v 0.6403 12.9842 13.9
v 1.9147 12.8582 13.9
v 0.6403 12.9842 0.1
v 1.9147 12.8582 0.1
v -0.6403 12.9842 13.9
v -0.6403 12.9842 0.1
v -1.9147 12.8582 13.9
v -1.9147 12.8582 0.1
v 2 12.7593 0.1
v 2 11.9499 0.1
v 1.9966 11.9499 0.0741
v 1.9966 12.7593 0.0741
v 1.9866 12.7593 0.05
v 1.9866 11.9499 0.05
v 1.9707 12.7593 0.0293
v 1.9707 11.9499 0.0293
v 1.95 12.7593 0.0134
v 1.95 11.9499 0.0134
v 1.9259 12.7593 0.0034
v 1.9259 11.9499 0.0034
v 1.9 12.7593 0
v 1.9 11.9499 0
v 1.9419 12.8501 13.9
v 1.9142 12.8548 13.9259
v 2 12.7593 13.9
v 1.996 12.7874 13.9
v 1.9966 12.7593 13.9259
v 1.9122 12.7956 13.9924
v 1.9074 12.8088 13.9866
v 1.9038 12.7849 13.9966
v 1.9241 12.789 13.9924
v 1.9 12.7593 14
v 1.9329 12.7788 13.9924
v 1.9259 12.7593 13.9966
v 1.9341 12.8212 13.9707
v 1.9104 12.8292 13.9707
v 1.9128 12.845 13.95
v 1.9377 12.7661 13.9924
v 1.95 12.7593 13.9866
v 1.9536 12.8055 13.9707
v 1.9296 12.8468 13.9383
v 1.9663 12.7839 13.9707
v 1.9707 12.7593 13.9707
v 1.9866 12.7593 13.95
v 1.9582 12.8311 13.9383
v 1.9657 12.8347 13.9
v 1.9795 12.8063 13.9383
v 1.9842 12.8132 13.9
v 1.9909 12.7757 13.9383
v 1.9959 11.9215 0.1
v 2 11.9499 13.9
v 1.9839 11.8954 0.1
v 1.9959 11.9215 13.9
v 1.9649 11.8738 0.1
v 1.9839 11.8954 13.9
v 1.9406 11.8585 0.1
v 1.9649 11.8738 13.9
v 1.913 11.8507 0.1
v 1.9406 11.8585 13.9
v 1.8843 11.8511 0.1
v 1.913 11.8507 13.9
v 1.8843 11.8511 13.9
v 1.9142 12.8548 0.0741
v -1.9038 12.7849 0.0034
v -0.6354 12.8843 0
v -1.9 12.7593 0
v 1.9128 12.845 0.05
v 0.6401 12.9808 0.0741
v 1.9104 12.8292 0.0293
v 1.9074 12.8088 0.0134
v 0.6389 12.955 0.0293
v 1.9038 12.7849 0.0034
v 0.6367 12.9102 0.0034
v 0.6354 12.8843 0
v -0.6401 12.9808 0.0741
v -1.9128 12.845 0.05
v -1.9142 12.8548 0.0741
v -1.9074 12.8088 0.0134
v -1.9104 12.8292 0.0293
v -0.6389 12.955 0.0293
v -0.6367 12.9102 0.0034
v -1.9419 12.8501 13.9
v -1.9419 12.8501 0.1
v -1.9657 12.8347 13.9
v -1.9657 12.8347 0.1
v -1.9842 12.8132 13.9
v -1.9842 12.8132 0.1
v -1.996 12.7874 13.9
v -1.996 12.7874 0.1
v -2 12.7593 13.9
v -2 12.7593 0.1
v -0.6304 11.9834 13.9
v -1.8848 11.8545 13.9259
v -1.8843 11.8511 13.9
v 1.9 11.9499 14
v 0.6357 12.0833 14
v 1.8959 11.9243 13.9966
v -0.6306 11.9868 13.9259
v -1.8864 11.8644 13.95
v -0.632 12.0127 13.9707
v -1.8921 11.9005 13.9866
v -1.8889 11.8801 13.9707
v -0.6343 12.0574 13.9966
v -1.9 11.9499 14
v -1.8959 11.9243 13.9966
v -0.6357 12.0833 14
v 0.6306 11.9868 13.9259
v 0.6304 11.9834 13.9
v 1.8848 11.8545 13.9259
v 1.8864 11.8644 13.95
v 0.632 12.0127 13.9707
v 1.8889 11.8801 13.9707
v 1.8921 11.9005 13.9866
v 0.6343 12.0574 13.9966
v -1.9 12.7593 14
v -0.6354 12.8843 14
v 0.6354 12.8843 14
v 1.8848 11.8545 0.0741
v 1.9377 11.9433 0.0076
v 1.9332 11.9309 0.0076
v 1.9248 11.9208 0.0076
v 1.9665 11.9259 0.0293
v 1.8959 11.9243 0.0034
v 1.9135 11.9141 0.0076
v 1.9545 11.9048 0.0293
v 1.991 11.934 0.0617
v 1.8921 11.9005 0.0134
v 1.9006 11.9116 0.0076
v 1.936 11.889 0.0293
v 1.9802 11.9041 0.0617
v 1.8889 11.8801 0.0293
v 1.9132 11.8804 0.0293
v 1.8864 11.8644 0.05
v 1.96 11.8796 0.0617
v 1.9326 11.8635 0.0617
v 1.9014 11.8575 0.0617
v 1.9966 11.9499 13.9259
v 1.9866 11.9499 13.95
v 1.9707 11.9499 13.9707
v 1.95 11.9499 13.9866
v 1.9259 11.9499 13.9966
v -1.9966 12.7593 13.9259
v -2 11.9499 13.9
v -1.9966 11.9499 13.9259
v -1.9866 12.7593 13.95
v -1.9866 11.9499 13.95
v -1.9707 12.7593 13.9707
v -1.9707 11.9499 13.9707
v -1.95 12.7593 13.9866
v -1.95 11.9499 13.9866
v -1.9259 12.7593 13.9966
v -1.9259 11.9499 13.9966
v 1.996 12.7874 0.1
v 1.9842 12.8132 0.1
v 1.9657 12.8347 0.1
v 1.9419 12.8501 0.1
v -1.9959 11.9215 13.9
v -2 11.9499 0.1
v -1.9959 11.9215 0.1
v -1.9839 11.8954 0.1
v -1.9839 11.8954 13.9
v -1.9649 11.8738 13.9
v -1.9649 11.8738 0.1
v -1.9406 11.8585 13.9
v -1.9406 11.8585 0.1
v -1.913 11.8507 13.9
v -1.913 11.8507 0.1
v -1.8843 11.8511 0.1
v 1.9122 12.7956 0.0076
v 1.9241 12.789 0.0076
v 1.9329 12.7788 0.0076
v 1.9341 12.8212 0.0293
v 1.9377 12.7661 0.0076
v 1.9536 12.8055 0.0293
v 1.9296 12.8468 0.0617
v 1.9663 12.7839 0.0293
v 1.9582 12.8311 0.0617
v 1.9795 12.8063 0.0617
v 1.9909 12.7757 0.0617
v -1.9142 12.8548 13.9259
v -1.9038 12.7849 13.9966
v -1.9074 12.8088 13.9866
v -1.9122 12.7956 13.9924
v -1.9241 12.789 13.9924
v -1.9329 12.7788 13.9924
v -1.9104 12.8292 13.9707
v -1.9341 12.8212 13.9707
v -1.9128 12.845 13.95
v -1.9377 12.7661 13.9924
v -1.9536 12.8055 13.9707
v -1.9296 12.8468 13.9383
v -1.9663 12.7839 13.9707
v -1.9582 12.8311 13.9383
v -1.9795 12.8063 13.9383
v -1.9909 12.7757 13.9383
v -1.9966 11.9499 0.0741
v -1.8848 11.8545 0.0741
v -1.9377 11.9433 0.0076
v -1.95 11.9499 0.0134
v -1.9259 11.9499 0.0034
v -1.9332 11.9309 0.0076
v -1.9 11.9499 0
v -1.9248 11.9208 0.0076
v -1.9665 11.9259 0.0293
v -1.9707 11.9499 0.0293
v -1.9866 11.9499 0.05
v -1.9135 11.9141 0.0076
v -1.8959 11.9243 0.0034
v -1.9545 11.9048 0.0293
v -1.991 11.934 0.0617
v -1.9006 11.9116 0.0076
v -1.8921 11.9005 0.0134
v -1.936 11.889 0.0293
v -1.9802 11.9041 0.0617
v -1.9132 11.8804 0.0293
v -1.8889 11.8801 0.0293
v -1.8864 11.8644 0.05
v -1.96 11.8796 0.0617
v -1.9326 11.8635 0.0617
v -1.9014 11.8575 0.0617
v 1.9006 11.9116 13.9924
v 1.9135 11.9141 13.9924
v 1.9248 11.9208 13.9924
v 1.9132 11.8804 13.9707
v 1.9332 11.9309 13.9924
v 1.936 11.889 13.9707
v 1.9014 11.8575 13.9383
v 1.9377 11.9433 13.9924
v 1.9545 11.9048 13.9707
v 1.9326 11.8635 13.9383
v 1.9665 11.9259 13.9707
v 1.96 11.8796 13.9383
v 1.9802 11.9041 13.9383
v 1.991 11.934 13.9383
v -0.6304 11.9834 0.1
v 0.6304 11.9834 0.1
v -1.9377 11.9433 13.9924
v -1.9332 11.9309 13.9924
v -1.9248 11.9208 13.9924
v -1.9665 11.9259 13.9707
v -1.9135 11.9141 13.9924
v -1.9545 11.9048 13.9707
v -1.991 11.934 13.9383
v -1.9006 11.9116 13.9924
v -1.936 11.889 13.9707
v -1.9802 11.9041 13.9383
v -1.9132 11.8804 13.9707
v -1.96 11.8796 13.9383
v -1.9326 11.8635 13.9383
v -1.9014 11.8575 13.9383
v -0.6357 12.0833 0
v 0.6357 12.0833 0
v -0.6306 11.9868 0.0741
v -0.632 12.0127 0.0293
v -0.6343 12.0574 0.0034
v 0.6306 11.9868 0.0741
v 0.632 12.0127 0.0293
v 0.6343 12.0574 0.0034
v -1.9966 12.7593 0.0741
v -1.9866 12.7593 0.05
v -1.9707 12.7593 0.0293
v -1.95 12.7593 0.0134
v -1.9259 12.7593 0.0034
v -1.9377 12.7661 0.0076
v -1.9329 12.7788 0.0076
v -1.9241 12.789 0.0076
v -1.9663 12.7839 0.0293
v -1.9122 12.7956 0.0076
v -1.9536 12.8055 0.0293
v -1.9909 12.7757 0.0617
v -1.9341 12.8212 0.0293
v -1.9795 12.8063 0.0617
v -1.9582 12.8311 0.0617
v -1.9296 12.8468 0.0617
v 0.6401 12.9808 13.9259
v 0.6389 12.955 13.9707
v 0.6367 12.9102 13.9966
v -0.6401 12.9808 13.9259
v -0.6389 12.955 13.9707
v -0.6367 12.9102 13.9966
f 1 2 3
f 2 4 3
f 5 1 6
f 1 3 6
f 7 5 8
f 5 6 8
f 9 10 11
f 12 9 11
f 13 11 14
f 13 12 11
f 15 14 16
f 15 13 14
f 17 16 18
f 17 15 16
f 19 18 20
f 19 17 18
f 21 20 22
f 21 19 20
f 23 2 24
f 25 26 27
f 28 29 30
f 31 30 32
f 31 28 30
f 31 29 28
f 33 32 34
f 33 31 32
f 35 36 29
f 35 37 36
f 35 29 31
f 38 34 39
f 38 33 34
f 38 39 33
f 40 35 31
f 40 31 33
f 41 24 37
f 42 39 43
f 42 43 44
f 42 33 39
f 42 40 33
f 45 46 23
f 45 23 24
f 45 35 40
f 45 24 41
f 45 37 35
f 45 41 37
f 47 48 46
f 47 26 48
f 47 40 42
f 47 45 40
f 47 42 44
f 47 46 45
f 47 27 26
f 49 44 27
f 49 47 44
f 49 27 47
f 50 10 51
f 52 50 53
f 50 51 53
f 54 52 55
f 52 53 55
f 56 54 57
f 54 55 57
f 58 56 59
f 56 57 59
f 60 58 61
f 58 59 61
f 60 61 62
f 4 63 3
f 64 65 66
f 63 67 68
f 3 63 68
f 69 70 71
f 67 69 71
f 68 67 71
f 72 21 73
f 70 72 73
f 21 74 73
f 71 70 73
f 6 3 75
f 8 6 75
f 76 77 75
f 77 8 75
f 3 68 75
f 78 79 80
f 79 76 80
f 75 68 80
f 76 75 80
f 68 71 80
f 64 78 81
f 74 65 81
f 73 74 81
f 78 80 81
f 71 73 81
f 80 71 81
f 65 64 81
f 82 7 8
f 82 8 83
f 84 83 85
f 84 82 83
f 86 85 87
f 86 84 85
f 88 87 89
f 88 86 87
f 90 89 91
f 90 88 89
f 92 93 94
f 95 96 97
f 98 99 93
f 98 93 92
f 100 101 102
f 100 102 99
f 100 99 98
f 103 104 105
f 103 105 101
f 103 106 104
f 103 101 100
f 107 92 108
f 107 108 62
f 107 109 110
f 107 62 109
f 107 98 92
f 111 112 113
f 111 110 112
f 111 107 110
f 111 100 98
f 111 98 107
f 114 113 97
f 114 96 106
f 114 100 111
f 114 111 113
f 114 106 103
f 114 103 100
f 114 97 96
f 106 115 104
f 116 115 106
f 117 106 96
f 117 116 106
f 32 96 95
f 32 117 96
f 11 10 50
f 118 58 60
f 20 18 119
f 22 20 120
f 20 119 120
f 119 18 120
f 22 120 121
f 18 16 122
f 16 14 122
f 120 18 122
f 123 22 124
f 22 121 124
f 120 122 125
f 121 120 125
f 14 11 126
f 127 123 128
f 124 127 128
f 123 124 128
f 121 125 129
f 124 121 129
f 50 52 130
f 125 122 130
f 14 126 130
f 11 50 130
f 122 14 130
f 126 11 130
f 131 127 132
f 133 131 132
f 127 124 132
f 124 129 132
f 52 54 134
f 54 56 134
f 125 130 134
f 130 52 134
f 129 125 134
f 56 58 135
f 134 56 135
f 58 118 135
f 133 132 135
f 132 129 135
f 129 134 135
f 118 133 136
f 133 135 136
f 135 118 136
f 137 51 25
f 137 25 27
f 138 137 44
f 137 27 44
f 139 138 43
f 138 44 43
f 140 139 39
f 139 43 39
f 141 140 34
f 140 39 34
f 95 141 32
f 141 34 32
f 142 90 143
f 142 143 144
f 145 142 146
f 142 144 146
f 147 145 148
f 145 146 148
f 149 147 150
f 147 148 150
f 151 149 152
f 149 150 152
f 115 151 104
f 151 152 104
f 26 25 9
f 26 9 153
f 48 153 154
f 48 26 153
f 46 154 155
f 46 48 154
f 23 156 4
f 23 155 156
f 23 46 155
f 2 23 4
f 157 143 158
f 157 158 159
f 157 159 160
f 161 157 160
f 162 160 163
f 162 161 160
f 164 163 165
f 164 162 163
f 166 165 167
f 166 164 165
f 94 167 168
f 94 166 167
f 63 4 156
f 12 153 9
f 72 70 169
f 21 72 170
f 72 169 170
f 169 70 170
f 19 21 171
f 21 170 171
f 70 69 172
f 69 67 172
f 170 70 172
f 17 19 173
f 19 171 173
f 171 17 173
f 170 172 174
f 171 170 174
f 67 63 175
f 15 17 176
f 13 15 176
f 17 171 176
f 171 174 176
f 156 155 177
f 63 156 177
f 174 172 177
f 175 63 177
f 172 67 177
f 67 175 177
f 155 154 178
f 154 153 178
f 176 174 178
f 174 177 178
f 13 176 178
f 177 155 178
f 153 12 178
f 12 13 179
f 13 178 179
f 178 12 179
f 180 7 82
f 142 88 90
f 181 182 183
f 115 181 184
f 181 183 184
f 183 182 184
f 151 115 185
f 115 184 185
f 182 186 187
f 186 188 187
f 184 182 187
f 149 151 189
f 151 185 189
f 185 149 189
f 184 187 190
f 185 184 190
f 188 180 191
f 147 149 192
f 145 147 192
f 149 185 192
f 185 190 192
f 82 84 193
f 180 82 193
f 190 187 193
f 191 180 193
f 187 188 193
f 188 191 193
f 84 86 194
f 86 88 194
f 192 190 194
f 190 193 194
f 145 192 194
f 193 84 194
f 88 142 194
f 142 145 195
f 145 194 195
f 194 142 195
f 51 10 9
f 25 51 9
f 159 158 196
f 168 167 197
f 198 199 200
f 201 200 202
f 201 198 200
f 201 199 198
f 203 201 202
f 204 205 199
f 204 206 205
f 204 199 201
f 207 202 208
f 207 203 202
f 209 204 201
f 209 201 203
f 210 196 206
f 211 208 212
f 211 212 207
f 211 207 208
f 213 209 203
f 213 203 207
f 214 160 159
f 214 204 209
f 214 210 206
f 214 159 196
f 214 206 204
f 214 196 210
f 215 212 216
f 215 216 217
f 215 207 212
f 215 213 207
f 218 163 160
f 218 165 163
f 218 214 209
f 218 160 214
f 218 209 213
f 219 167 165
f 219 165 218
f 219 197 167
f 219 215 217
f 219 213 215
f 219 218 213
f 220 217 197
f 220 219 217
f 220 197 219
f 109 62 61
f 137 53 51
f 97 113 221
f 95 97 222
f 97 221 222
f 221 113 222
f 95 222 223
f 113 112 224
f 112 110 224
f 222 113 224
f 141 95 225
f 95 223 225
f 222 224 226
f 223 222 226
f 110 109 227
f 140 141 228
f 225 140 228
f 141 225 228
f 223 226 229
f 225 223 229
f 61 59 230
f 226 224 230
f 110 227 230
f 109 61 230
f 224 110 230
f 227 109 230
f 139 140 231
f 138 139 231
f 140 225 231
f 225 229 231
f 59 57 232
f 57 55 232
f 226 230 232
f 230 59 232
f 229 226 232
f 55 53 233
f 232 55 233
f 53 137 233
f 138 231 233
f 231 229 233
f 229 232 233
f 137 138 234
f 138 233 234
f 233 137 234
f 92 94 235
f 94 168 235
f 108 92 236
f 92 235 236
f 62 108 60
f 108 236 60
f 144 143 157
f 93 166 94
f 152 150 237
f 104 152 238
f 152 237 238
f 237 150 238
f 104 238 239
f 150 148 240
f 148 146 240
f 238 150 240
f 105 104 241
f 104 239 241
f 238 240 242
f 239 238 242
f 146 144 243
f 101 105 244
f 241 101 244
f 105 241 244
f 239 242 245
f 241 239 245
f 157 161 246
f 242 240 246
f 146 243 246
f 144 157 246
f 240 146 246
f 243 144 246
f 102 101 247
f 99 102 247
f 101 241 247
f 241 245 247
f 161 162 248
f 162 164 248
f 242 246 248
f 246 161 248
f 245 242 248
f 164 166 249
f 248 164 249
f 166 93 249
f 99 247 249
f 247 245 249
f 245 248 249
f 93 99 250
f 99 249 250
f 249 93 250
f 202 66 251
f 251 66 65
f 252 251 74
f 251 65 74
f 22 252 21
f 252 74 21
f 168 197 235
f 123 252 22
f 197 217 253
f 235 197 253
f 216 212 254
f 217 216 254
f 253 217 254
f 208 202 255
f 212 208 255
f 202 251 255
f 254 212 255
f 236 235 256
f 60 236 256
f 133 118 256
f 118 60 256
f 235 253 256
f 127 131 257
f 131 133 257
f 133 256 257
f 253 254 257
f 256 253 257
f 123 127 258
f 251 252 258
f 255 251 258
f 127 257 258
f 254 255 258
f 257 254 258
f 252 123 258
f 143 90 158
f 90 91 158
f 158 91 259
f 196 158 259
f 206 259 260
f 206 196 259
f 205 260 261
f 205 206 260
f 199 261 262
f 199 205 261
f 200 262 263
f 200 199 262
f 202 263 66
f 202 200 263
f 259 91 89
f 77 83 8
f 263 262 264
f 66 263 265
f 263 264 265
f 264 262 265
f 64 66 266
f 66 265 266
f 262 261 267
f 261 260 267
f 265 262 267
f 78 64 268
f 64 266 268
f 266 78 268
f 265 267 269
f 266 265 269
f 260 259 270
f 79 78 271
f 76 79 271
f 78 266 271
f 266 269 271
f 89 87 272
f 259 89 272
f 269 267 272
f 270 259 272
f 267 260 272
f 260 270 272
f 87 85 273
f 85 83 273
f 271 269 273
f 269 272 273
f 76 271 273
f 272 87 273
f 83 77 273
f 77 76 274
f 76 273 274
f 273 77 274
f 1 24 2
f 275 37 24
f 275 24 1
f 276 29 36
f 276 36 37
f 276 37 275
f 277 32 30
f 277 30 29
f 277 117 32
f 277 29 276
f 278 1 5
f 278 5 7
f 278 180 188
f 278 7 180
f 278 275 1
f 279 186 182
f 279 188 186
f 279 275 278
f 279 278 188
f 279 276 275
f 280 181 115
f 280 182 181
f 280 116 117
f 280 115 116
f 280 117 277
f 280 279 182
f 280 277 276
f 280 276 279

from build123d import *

# Parameters (mm, degrees)
BOSS_EXTRUDE1_DEPTH = 14
FILLET1_R           = 0.1


with BuildPart() as part:
    # Sketch1 → Boss-Extrude1 (new body)
    with BuildSketch(Plane.XY):
        with BuildLine():
            Line((2, 11.832159566), (2, 12.845232579))
            ThreePointArc((2, 12.845232579), (0, 13), (-2, 12.845232579))
            Line((-2, 12.845232579), (-2, 11.832159566))
            ThreePointArc((-2, 11.832159566), (0, 12), (2, 11.832159566))
        make_face()
    extrude(amount=BOSS_EXTRUDE1_DEPTH)

    # Fillet1
    fillet1_edges = [part.edges().sort_by_distance(p)[0] for p in [
        (0, 13, 14),
        (-2, 12.338696072, 14),
        (0, 12, 14),
        (-2, 12.338696072, 0),
        (0, 13, 0),
        (2, 12.338696072, 0),
        (0, 12, 0),
        (2, 12.338696072, 14),
        (-2, 11.832159566, 7),
        (-2, 12.845232579, 7),
        (2, 12.845232579, 7),
        (2, 11.832159566, 7),
    ]]
    fillet(fillet1_edges, radius=FILLET1_R)


solid = part.part
